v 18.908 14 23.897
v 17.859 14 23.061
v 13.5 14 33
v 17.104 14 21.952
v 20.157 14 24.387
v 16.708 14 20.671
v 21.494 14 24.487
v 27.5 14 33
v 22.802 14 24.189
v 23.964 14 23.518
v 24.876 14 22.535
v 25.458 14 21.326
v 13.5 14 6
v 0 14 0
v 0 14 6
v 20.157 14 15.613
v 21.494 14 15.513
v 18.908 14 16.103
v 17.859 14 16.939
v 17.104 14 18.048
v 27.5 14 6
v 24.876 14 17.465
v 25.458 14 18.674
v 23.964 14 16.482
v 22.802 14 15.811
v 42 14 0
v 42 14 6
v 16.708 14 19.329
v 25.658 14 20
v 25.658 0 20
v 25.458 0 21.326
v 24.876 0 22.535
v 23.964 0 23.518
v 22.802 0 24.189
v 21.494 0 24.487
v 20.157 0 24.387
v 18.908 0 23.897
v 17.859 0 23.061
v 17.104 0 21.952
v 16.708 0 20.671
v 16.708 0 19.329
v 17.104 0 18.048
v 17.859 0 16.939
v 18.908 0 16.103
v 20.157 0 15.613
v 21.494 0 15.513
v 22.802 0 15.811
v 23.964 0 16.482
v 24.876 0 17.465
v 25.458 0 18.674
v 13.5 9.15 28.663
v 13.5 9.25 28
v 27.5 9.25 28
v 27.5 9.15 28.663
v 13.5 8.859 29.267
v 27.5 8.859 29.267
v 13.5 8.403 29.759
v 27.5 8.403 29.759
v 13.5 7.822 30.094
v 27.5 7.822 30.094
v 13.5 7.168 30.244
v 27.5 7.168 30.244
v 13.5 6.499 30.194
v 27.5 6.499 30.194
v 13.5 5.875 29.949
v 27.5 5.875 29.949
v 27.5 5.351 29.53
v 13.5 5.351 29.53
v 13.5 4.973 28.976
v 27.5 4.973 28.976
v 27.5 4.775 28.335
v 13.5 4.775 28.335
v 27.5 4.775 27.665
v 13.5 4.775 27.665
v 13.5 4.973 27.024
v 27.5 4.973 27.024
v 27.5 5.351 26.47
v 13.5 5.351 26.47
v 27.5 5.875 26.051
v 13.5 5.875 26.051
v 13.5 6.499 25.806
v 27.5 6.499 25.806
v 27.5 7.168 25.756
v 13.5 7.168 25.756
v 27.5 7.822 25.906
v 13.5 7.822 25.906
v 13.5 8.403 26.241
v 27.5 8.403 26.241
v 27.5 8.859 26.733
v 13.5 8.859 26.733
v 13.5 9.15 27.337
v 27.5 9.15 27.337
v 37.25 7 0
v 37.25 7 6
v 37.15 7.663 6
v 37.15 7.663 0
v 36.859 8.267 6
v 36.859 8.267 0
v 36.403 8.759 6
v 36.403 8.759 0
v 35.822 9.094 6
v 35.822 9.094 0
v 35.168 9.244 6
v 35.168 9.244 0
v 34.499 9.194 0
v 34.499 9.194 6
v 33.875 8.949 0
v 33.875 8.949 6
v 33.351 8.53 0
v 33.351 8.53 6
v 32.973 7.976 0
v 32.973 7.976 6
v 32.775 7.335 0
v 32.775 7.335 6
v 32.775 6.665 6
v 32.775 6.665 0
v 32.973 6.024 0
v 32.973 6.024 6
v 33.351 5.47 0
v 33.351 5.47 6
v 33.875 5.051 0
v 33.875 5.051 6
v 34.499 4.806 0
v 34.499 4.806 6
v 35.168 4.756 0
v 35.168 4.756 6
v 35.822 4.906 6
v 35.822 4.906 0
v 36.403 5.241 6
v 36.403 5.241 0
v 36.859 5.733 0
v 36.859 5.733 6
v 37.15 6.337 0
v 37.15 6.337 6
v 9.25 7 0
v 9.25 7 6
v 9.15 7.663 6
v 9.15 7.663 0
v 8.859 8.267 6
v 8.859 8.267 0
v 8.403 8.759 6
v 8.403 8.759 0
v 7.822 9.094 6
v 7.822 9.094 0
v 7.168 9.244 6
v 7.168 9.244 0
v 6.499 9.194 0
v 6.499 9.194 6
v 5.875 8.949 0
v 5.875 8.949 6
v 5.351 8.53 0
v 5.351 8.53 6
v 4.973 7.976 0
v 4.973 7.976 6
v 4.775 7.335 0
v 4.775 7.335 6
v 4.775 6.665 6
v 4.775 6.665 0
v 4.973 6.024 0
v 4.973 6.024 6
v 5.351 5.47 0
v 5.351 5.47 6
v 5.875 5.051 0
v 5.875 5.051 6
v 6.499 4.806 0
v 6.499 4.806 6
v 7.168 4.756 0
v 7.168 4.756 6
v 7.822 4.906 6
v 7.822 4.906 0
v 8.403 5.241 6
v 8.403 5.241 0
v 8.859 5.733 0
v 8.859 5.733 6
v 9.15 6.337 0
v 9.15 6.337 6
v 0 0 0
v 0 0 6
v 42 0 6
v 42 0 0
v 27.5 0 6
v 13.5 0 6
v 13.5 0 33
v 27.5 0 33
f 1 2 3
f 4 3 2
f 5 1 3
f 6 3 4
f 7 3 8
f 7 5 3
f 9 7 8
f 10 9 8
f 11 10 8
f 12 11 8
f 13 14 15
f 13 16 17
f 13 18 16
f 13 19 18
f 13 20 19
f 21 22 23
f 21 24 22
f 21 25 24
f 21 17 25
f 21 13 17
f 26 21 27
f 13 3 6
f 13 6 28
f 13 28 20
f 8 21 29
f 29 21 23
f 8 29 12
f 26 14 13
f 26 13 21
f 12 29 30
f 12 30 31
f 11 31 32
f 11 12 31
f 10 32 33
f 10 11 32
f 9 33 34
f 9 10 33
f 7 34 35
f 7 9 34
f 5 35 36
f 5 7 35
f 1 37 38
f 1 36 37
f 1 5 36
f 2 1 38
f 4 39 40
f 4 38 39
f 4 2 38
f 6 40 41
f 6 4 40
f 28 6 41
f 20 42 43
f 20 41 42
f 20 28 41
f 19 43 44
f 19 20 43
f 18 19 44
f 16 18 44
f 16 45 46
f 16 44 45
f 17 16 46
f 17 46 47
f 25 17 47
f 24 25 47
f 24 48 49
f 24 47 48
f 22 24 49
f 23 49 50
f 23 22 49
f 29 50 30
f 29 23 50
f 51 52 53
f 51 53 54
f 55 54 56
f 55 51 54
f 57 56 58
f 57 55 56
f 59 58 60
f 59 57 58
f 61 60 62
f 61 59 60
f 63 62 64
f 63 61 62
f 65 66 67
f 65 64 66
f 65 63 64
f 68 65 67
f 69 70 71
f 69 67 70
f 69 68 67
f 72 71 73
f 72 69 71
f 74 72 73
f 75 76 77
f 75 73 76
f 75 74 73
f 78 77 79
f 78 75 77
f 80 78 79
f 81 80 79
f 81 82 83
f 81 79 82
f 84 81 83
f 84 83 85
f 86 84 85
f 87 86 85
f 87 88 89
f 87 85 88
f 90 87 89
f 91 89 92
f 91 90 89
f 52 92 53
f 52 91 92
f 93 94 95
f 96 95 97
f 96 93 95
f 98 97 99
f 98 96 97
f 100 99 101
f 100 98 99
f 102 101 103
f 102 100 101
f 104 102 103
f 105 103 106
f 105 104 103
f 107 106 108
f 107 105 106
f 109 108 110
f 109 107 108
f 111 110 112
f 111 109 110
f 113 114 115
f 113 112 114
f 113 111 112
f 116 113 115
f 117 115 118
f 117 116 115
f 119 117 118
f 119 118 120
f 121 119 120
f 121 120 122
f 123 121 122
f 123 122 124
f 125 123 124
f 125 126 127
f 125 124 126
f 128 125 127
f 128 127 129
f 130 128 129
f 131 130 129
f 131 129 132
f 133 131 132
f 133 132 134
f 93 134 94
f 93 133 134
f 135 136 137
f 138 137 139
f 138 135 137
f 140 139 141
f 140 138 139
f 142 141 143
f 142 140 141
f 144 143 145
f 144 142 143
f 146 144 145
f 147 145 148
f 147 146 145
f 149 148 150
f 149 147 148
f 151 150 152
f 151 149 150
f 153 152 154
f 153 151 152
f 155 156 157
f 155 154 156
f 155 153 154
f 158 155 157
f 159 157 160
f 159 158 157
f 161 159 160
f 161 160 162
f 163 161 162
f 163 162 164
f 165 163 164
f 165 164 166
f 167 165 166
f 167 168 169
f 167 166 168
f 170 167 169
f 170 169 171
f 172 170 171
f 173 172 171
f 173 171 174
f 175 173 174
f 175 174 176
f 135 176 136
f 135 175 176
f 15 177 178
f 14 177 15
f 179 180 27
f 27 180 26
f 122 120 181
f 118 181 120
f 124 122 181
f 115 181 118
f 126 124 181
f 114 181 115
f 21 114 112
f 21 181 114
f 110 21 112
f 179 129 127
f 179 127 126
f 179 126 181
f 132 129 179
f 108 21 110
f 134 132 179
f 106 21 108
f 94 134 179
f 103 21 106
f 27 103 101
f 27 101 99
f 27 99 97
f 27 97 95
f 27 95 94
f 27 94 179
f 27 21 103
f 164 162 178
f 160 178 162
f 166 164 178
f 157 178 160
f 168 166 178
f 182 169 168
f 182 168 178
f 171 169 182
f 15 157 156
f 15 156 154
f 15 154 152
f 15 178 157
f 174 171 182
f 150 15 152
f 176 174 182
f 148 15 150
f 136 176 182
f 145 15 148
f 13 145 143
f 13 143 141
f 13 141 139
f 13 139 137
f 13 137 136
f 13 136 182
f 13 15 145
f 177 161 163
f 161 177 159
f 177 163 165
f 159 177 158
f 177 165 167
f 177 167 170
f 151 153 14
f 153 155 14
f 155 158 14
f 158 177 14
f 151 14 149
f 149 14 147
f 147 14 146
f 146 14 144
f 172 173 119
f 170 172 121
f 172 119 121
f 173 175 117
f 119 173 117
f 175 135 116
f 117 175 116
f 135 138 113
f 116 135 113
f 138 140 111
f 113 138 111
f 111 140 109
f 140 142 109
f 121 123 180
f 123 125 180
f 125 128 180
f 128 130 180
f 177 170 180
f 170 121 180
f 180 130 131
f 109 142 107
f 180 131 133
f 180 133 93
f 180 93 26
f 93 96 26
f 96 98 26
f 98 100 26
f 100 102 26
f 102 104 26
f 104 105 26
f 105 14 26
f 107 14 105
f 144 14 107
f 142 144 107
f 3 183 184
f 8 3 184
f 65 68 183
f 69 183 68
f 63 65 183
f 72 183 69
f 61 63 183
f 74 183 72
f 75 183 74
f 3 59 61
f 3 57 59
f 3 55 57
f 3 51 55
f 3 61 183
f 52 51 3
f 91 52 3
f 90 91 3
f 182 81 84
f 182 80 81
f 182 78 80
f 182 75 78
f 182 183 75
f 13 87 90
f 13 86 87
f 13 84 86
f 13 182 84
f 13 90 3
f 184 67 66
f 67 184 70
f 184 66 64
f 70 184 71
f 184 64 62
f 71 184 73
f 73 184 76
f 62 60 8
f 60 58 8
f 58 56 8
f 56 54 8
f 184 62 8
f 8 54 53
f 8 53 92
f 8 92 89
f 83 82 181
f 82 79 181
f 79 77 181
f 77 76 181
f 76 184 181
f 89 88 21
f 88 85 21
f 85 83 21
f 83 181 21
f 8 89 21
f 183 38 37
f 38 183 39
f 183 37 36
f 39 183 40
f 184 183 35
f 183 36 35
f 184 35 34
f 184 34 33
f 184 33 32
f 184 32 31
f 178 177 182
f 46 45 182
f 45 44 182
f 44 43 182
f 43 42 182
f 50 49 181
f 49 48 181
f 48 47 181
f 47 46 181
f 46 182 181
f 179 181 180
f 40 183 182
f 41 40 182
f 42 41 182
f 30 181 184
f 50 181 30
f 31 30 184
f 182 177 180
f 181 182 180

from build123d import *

# Parameters (mm, degrees)
CYLINDER003_R       = 2.25
CYLINDER003_DEPTH   = 10
CYLINDER002_R       = 2.25
CYLINDER002_DEPTH   = 10
CYLINDER001_R       = 2.25
CYLINDER001_DEPTH   = 30
CYLINDER_R          = 4.5
CYLINDER_DEPTH      = 30
CYLINDER_ROLL_ANGLE = 90
BOX001_W            = 14
BOX001_H            = 14
BOX001_DEPTH        = 27
BOX_W               = 42
BOX_H               = 14
BOX_DEPTH           = 6


with BuildPart() as cilindro003:
    # Cylinder003 → Cylinder003 (new body)
    with BuildSketch(Plane(origin=(35, 7, 0), x_dir=(1, 0, 0), z_dir=(0, 0, 1))):
        Circle(CYLINDER003_R)
    extrude(amount=CYLINDER003_DEPTH)


with BuildPart() as cilindro002:
    # Cylinder002 → Cylinder002 (new body)
    with BuildSketch(Plane(origin=(7, 7, 0), x_dir=(1, 0, 0), z_dir=(0, 0, 1))):
        Circle(CYLINDER002_R)
    extrude(amount=CYLINDER002_DEPTH)


with BuildPart() as cilindro001:
    # Cylinder001 → Cylinder001 (new body)
    with BuildSketch(Plane(origin=(10, 7, 28), x_dir=(0, 1, 0), z_dir=(1, 0, 0))):
        Circle(CYLINDER001_R)
    extrude(amount=CYLINDER001_DEPTH)


with BuildPart() as cilindro:
    # Cylinder → Cylinder (new body)
    with BuildSketch(Plane.XY):
        Circle(CYLINDER_R)
    extrude(amount=CYLINDER_DEPTH)


with BuildPart() as cilindro_1:
    # Cylinder roll: moved
    add(cilindro.part.rotate(Axis((0, 0, 0), (1, 0, 0)), CYLINDER_ROLL_ANGLE))


with BuildPart() as cilindro_2:
    # Cylinder placement: moved
    add(cilindro_1.part.moved(Location((21.158, 20, 20))))


with BuildPart() as cubo001:
    # Box001 → Box001 (new body)
    with BuildSketch(Plane(origin=(13.5, 0, 6), x_dir=(1, 0, 0), z_dir=(0, 0, 1))):
        with Locations((7, 7)):
            Rectangle(BOX001_W, BOX001_H)
    extrude(amount=BOX001_DEPTH)


with BuildPart() as cut003:
    # Box → Box (new body)
    with BuildSketch(Plane.XY):
        with Locations((21, 7)):
            Rectangle(BOX_W, BOX_H)
    extrude(amount=BOX_DEPTH)

    # Fusion: union Cubo001
    add(cubo001.part)

    # Cut: cut Cilindro
    add(cilindro_2.part, mode=Mode.SUBTRACT)

    # Cut001: cut Cilindro001
    add(cilindro001.part, mode=Mode.SUBTRACT)

    # Cut002: cut Cilindro002
    add(cilindro002.part, mode=Mode.SUBTRACT)

    # Cut003: cut Cilindro003
    add(cilindro003.part, mode=Mode.SUBTRACT)


solid = cut003.part
